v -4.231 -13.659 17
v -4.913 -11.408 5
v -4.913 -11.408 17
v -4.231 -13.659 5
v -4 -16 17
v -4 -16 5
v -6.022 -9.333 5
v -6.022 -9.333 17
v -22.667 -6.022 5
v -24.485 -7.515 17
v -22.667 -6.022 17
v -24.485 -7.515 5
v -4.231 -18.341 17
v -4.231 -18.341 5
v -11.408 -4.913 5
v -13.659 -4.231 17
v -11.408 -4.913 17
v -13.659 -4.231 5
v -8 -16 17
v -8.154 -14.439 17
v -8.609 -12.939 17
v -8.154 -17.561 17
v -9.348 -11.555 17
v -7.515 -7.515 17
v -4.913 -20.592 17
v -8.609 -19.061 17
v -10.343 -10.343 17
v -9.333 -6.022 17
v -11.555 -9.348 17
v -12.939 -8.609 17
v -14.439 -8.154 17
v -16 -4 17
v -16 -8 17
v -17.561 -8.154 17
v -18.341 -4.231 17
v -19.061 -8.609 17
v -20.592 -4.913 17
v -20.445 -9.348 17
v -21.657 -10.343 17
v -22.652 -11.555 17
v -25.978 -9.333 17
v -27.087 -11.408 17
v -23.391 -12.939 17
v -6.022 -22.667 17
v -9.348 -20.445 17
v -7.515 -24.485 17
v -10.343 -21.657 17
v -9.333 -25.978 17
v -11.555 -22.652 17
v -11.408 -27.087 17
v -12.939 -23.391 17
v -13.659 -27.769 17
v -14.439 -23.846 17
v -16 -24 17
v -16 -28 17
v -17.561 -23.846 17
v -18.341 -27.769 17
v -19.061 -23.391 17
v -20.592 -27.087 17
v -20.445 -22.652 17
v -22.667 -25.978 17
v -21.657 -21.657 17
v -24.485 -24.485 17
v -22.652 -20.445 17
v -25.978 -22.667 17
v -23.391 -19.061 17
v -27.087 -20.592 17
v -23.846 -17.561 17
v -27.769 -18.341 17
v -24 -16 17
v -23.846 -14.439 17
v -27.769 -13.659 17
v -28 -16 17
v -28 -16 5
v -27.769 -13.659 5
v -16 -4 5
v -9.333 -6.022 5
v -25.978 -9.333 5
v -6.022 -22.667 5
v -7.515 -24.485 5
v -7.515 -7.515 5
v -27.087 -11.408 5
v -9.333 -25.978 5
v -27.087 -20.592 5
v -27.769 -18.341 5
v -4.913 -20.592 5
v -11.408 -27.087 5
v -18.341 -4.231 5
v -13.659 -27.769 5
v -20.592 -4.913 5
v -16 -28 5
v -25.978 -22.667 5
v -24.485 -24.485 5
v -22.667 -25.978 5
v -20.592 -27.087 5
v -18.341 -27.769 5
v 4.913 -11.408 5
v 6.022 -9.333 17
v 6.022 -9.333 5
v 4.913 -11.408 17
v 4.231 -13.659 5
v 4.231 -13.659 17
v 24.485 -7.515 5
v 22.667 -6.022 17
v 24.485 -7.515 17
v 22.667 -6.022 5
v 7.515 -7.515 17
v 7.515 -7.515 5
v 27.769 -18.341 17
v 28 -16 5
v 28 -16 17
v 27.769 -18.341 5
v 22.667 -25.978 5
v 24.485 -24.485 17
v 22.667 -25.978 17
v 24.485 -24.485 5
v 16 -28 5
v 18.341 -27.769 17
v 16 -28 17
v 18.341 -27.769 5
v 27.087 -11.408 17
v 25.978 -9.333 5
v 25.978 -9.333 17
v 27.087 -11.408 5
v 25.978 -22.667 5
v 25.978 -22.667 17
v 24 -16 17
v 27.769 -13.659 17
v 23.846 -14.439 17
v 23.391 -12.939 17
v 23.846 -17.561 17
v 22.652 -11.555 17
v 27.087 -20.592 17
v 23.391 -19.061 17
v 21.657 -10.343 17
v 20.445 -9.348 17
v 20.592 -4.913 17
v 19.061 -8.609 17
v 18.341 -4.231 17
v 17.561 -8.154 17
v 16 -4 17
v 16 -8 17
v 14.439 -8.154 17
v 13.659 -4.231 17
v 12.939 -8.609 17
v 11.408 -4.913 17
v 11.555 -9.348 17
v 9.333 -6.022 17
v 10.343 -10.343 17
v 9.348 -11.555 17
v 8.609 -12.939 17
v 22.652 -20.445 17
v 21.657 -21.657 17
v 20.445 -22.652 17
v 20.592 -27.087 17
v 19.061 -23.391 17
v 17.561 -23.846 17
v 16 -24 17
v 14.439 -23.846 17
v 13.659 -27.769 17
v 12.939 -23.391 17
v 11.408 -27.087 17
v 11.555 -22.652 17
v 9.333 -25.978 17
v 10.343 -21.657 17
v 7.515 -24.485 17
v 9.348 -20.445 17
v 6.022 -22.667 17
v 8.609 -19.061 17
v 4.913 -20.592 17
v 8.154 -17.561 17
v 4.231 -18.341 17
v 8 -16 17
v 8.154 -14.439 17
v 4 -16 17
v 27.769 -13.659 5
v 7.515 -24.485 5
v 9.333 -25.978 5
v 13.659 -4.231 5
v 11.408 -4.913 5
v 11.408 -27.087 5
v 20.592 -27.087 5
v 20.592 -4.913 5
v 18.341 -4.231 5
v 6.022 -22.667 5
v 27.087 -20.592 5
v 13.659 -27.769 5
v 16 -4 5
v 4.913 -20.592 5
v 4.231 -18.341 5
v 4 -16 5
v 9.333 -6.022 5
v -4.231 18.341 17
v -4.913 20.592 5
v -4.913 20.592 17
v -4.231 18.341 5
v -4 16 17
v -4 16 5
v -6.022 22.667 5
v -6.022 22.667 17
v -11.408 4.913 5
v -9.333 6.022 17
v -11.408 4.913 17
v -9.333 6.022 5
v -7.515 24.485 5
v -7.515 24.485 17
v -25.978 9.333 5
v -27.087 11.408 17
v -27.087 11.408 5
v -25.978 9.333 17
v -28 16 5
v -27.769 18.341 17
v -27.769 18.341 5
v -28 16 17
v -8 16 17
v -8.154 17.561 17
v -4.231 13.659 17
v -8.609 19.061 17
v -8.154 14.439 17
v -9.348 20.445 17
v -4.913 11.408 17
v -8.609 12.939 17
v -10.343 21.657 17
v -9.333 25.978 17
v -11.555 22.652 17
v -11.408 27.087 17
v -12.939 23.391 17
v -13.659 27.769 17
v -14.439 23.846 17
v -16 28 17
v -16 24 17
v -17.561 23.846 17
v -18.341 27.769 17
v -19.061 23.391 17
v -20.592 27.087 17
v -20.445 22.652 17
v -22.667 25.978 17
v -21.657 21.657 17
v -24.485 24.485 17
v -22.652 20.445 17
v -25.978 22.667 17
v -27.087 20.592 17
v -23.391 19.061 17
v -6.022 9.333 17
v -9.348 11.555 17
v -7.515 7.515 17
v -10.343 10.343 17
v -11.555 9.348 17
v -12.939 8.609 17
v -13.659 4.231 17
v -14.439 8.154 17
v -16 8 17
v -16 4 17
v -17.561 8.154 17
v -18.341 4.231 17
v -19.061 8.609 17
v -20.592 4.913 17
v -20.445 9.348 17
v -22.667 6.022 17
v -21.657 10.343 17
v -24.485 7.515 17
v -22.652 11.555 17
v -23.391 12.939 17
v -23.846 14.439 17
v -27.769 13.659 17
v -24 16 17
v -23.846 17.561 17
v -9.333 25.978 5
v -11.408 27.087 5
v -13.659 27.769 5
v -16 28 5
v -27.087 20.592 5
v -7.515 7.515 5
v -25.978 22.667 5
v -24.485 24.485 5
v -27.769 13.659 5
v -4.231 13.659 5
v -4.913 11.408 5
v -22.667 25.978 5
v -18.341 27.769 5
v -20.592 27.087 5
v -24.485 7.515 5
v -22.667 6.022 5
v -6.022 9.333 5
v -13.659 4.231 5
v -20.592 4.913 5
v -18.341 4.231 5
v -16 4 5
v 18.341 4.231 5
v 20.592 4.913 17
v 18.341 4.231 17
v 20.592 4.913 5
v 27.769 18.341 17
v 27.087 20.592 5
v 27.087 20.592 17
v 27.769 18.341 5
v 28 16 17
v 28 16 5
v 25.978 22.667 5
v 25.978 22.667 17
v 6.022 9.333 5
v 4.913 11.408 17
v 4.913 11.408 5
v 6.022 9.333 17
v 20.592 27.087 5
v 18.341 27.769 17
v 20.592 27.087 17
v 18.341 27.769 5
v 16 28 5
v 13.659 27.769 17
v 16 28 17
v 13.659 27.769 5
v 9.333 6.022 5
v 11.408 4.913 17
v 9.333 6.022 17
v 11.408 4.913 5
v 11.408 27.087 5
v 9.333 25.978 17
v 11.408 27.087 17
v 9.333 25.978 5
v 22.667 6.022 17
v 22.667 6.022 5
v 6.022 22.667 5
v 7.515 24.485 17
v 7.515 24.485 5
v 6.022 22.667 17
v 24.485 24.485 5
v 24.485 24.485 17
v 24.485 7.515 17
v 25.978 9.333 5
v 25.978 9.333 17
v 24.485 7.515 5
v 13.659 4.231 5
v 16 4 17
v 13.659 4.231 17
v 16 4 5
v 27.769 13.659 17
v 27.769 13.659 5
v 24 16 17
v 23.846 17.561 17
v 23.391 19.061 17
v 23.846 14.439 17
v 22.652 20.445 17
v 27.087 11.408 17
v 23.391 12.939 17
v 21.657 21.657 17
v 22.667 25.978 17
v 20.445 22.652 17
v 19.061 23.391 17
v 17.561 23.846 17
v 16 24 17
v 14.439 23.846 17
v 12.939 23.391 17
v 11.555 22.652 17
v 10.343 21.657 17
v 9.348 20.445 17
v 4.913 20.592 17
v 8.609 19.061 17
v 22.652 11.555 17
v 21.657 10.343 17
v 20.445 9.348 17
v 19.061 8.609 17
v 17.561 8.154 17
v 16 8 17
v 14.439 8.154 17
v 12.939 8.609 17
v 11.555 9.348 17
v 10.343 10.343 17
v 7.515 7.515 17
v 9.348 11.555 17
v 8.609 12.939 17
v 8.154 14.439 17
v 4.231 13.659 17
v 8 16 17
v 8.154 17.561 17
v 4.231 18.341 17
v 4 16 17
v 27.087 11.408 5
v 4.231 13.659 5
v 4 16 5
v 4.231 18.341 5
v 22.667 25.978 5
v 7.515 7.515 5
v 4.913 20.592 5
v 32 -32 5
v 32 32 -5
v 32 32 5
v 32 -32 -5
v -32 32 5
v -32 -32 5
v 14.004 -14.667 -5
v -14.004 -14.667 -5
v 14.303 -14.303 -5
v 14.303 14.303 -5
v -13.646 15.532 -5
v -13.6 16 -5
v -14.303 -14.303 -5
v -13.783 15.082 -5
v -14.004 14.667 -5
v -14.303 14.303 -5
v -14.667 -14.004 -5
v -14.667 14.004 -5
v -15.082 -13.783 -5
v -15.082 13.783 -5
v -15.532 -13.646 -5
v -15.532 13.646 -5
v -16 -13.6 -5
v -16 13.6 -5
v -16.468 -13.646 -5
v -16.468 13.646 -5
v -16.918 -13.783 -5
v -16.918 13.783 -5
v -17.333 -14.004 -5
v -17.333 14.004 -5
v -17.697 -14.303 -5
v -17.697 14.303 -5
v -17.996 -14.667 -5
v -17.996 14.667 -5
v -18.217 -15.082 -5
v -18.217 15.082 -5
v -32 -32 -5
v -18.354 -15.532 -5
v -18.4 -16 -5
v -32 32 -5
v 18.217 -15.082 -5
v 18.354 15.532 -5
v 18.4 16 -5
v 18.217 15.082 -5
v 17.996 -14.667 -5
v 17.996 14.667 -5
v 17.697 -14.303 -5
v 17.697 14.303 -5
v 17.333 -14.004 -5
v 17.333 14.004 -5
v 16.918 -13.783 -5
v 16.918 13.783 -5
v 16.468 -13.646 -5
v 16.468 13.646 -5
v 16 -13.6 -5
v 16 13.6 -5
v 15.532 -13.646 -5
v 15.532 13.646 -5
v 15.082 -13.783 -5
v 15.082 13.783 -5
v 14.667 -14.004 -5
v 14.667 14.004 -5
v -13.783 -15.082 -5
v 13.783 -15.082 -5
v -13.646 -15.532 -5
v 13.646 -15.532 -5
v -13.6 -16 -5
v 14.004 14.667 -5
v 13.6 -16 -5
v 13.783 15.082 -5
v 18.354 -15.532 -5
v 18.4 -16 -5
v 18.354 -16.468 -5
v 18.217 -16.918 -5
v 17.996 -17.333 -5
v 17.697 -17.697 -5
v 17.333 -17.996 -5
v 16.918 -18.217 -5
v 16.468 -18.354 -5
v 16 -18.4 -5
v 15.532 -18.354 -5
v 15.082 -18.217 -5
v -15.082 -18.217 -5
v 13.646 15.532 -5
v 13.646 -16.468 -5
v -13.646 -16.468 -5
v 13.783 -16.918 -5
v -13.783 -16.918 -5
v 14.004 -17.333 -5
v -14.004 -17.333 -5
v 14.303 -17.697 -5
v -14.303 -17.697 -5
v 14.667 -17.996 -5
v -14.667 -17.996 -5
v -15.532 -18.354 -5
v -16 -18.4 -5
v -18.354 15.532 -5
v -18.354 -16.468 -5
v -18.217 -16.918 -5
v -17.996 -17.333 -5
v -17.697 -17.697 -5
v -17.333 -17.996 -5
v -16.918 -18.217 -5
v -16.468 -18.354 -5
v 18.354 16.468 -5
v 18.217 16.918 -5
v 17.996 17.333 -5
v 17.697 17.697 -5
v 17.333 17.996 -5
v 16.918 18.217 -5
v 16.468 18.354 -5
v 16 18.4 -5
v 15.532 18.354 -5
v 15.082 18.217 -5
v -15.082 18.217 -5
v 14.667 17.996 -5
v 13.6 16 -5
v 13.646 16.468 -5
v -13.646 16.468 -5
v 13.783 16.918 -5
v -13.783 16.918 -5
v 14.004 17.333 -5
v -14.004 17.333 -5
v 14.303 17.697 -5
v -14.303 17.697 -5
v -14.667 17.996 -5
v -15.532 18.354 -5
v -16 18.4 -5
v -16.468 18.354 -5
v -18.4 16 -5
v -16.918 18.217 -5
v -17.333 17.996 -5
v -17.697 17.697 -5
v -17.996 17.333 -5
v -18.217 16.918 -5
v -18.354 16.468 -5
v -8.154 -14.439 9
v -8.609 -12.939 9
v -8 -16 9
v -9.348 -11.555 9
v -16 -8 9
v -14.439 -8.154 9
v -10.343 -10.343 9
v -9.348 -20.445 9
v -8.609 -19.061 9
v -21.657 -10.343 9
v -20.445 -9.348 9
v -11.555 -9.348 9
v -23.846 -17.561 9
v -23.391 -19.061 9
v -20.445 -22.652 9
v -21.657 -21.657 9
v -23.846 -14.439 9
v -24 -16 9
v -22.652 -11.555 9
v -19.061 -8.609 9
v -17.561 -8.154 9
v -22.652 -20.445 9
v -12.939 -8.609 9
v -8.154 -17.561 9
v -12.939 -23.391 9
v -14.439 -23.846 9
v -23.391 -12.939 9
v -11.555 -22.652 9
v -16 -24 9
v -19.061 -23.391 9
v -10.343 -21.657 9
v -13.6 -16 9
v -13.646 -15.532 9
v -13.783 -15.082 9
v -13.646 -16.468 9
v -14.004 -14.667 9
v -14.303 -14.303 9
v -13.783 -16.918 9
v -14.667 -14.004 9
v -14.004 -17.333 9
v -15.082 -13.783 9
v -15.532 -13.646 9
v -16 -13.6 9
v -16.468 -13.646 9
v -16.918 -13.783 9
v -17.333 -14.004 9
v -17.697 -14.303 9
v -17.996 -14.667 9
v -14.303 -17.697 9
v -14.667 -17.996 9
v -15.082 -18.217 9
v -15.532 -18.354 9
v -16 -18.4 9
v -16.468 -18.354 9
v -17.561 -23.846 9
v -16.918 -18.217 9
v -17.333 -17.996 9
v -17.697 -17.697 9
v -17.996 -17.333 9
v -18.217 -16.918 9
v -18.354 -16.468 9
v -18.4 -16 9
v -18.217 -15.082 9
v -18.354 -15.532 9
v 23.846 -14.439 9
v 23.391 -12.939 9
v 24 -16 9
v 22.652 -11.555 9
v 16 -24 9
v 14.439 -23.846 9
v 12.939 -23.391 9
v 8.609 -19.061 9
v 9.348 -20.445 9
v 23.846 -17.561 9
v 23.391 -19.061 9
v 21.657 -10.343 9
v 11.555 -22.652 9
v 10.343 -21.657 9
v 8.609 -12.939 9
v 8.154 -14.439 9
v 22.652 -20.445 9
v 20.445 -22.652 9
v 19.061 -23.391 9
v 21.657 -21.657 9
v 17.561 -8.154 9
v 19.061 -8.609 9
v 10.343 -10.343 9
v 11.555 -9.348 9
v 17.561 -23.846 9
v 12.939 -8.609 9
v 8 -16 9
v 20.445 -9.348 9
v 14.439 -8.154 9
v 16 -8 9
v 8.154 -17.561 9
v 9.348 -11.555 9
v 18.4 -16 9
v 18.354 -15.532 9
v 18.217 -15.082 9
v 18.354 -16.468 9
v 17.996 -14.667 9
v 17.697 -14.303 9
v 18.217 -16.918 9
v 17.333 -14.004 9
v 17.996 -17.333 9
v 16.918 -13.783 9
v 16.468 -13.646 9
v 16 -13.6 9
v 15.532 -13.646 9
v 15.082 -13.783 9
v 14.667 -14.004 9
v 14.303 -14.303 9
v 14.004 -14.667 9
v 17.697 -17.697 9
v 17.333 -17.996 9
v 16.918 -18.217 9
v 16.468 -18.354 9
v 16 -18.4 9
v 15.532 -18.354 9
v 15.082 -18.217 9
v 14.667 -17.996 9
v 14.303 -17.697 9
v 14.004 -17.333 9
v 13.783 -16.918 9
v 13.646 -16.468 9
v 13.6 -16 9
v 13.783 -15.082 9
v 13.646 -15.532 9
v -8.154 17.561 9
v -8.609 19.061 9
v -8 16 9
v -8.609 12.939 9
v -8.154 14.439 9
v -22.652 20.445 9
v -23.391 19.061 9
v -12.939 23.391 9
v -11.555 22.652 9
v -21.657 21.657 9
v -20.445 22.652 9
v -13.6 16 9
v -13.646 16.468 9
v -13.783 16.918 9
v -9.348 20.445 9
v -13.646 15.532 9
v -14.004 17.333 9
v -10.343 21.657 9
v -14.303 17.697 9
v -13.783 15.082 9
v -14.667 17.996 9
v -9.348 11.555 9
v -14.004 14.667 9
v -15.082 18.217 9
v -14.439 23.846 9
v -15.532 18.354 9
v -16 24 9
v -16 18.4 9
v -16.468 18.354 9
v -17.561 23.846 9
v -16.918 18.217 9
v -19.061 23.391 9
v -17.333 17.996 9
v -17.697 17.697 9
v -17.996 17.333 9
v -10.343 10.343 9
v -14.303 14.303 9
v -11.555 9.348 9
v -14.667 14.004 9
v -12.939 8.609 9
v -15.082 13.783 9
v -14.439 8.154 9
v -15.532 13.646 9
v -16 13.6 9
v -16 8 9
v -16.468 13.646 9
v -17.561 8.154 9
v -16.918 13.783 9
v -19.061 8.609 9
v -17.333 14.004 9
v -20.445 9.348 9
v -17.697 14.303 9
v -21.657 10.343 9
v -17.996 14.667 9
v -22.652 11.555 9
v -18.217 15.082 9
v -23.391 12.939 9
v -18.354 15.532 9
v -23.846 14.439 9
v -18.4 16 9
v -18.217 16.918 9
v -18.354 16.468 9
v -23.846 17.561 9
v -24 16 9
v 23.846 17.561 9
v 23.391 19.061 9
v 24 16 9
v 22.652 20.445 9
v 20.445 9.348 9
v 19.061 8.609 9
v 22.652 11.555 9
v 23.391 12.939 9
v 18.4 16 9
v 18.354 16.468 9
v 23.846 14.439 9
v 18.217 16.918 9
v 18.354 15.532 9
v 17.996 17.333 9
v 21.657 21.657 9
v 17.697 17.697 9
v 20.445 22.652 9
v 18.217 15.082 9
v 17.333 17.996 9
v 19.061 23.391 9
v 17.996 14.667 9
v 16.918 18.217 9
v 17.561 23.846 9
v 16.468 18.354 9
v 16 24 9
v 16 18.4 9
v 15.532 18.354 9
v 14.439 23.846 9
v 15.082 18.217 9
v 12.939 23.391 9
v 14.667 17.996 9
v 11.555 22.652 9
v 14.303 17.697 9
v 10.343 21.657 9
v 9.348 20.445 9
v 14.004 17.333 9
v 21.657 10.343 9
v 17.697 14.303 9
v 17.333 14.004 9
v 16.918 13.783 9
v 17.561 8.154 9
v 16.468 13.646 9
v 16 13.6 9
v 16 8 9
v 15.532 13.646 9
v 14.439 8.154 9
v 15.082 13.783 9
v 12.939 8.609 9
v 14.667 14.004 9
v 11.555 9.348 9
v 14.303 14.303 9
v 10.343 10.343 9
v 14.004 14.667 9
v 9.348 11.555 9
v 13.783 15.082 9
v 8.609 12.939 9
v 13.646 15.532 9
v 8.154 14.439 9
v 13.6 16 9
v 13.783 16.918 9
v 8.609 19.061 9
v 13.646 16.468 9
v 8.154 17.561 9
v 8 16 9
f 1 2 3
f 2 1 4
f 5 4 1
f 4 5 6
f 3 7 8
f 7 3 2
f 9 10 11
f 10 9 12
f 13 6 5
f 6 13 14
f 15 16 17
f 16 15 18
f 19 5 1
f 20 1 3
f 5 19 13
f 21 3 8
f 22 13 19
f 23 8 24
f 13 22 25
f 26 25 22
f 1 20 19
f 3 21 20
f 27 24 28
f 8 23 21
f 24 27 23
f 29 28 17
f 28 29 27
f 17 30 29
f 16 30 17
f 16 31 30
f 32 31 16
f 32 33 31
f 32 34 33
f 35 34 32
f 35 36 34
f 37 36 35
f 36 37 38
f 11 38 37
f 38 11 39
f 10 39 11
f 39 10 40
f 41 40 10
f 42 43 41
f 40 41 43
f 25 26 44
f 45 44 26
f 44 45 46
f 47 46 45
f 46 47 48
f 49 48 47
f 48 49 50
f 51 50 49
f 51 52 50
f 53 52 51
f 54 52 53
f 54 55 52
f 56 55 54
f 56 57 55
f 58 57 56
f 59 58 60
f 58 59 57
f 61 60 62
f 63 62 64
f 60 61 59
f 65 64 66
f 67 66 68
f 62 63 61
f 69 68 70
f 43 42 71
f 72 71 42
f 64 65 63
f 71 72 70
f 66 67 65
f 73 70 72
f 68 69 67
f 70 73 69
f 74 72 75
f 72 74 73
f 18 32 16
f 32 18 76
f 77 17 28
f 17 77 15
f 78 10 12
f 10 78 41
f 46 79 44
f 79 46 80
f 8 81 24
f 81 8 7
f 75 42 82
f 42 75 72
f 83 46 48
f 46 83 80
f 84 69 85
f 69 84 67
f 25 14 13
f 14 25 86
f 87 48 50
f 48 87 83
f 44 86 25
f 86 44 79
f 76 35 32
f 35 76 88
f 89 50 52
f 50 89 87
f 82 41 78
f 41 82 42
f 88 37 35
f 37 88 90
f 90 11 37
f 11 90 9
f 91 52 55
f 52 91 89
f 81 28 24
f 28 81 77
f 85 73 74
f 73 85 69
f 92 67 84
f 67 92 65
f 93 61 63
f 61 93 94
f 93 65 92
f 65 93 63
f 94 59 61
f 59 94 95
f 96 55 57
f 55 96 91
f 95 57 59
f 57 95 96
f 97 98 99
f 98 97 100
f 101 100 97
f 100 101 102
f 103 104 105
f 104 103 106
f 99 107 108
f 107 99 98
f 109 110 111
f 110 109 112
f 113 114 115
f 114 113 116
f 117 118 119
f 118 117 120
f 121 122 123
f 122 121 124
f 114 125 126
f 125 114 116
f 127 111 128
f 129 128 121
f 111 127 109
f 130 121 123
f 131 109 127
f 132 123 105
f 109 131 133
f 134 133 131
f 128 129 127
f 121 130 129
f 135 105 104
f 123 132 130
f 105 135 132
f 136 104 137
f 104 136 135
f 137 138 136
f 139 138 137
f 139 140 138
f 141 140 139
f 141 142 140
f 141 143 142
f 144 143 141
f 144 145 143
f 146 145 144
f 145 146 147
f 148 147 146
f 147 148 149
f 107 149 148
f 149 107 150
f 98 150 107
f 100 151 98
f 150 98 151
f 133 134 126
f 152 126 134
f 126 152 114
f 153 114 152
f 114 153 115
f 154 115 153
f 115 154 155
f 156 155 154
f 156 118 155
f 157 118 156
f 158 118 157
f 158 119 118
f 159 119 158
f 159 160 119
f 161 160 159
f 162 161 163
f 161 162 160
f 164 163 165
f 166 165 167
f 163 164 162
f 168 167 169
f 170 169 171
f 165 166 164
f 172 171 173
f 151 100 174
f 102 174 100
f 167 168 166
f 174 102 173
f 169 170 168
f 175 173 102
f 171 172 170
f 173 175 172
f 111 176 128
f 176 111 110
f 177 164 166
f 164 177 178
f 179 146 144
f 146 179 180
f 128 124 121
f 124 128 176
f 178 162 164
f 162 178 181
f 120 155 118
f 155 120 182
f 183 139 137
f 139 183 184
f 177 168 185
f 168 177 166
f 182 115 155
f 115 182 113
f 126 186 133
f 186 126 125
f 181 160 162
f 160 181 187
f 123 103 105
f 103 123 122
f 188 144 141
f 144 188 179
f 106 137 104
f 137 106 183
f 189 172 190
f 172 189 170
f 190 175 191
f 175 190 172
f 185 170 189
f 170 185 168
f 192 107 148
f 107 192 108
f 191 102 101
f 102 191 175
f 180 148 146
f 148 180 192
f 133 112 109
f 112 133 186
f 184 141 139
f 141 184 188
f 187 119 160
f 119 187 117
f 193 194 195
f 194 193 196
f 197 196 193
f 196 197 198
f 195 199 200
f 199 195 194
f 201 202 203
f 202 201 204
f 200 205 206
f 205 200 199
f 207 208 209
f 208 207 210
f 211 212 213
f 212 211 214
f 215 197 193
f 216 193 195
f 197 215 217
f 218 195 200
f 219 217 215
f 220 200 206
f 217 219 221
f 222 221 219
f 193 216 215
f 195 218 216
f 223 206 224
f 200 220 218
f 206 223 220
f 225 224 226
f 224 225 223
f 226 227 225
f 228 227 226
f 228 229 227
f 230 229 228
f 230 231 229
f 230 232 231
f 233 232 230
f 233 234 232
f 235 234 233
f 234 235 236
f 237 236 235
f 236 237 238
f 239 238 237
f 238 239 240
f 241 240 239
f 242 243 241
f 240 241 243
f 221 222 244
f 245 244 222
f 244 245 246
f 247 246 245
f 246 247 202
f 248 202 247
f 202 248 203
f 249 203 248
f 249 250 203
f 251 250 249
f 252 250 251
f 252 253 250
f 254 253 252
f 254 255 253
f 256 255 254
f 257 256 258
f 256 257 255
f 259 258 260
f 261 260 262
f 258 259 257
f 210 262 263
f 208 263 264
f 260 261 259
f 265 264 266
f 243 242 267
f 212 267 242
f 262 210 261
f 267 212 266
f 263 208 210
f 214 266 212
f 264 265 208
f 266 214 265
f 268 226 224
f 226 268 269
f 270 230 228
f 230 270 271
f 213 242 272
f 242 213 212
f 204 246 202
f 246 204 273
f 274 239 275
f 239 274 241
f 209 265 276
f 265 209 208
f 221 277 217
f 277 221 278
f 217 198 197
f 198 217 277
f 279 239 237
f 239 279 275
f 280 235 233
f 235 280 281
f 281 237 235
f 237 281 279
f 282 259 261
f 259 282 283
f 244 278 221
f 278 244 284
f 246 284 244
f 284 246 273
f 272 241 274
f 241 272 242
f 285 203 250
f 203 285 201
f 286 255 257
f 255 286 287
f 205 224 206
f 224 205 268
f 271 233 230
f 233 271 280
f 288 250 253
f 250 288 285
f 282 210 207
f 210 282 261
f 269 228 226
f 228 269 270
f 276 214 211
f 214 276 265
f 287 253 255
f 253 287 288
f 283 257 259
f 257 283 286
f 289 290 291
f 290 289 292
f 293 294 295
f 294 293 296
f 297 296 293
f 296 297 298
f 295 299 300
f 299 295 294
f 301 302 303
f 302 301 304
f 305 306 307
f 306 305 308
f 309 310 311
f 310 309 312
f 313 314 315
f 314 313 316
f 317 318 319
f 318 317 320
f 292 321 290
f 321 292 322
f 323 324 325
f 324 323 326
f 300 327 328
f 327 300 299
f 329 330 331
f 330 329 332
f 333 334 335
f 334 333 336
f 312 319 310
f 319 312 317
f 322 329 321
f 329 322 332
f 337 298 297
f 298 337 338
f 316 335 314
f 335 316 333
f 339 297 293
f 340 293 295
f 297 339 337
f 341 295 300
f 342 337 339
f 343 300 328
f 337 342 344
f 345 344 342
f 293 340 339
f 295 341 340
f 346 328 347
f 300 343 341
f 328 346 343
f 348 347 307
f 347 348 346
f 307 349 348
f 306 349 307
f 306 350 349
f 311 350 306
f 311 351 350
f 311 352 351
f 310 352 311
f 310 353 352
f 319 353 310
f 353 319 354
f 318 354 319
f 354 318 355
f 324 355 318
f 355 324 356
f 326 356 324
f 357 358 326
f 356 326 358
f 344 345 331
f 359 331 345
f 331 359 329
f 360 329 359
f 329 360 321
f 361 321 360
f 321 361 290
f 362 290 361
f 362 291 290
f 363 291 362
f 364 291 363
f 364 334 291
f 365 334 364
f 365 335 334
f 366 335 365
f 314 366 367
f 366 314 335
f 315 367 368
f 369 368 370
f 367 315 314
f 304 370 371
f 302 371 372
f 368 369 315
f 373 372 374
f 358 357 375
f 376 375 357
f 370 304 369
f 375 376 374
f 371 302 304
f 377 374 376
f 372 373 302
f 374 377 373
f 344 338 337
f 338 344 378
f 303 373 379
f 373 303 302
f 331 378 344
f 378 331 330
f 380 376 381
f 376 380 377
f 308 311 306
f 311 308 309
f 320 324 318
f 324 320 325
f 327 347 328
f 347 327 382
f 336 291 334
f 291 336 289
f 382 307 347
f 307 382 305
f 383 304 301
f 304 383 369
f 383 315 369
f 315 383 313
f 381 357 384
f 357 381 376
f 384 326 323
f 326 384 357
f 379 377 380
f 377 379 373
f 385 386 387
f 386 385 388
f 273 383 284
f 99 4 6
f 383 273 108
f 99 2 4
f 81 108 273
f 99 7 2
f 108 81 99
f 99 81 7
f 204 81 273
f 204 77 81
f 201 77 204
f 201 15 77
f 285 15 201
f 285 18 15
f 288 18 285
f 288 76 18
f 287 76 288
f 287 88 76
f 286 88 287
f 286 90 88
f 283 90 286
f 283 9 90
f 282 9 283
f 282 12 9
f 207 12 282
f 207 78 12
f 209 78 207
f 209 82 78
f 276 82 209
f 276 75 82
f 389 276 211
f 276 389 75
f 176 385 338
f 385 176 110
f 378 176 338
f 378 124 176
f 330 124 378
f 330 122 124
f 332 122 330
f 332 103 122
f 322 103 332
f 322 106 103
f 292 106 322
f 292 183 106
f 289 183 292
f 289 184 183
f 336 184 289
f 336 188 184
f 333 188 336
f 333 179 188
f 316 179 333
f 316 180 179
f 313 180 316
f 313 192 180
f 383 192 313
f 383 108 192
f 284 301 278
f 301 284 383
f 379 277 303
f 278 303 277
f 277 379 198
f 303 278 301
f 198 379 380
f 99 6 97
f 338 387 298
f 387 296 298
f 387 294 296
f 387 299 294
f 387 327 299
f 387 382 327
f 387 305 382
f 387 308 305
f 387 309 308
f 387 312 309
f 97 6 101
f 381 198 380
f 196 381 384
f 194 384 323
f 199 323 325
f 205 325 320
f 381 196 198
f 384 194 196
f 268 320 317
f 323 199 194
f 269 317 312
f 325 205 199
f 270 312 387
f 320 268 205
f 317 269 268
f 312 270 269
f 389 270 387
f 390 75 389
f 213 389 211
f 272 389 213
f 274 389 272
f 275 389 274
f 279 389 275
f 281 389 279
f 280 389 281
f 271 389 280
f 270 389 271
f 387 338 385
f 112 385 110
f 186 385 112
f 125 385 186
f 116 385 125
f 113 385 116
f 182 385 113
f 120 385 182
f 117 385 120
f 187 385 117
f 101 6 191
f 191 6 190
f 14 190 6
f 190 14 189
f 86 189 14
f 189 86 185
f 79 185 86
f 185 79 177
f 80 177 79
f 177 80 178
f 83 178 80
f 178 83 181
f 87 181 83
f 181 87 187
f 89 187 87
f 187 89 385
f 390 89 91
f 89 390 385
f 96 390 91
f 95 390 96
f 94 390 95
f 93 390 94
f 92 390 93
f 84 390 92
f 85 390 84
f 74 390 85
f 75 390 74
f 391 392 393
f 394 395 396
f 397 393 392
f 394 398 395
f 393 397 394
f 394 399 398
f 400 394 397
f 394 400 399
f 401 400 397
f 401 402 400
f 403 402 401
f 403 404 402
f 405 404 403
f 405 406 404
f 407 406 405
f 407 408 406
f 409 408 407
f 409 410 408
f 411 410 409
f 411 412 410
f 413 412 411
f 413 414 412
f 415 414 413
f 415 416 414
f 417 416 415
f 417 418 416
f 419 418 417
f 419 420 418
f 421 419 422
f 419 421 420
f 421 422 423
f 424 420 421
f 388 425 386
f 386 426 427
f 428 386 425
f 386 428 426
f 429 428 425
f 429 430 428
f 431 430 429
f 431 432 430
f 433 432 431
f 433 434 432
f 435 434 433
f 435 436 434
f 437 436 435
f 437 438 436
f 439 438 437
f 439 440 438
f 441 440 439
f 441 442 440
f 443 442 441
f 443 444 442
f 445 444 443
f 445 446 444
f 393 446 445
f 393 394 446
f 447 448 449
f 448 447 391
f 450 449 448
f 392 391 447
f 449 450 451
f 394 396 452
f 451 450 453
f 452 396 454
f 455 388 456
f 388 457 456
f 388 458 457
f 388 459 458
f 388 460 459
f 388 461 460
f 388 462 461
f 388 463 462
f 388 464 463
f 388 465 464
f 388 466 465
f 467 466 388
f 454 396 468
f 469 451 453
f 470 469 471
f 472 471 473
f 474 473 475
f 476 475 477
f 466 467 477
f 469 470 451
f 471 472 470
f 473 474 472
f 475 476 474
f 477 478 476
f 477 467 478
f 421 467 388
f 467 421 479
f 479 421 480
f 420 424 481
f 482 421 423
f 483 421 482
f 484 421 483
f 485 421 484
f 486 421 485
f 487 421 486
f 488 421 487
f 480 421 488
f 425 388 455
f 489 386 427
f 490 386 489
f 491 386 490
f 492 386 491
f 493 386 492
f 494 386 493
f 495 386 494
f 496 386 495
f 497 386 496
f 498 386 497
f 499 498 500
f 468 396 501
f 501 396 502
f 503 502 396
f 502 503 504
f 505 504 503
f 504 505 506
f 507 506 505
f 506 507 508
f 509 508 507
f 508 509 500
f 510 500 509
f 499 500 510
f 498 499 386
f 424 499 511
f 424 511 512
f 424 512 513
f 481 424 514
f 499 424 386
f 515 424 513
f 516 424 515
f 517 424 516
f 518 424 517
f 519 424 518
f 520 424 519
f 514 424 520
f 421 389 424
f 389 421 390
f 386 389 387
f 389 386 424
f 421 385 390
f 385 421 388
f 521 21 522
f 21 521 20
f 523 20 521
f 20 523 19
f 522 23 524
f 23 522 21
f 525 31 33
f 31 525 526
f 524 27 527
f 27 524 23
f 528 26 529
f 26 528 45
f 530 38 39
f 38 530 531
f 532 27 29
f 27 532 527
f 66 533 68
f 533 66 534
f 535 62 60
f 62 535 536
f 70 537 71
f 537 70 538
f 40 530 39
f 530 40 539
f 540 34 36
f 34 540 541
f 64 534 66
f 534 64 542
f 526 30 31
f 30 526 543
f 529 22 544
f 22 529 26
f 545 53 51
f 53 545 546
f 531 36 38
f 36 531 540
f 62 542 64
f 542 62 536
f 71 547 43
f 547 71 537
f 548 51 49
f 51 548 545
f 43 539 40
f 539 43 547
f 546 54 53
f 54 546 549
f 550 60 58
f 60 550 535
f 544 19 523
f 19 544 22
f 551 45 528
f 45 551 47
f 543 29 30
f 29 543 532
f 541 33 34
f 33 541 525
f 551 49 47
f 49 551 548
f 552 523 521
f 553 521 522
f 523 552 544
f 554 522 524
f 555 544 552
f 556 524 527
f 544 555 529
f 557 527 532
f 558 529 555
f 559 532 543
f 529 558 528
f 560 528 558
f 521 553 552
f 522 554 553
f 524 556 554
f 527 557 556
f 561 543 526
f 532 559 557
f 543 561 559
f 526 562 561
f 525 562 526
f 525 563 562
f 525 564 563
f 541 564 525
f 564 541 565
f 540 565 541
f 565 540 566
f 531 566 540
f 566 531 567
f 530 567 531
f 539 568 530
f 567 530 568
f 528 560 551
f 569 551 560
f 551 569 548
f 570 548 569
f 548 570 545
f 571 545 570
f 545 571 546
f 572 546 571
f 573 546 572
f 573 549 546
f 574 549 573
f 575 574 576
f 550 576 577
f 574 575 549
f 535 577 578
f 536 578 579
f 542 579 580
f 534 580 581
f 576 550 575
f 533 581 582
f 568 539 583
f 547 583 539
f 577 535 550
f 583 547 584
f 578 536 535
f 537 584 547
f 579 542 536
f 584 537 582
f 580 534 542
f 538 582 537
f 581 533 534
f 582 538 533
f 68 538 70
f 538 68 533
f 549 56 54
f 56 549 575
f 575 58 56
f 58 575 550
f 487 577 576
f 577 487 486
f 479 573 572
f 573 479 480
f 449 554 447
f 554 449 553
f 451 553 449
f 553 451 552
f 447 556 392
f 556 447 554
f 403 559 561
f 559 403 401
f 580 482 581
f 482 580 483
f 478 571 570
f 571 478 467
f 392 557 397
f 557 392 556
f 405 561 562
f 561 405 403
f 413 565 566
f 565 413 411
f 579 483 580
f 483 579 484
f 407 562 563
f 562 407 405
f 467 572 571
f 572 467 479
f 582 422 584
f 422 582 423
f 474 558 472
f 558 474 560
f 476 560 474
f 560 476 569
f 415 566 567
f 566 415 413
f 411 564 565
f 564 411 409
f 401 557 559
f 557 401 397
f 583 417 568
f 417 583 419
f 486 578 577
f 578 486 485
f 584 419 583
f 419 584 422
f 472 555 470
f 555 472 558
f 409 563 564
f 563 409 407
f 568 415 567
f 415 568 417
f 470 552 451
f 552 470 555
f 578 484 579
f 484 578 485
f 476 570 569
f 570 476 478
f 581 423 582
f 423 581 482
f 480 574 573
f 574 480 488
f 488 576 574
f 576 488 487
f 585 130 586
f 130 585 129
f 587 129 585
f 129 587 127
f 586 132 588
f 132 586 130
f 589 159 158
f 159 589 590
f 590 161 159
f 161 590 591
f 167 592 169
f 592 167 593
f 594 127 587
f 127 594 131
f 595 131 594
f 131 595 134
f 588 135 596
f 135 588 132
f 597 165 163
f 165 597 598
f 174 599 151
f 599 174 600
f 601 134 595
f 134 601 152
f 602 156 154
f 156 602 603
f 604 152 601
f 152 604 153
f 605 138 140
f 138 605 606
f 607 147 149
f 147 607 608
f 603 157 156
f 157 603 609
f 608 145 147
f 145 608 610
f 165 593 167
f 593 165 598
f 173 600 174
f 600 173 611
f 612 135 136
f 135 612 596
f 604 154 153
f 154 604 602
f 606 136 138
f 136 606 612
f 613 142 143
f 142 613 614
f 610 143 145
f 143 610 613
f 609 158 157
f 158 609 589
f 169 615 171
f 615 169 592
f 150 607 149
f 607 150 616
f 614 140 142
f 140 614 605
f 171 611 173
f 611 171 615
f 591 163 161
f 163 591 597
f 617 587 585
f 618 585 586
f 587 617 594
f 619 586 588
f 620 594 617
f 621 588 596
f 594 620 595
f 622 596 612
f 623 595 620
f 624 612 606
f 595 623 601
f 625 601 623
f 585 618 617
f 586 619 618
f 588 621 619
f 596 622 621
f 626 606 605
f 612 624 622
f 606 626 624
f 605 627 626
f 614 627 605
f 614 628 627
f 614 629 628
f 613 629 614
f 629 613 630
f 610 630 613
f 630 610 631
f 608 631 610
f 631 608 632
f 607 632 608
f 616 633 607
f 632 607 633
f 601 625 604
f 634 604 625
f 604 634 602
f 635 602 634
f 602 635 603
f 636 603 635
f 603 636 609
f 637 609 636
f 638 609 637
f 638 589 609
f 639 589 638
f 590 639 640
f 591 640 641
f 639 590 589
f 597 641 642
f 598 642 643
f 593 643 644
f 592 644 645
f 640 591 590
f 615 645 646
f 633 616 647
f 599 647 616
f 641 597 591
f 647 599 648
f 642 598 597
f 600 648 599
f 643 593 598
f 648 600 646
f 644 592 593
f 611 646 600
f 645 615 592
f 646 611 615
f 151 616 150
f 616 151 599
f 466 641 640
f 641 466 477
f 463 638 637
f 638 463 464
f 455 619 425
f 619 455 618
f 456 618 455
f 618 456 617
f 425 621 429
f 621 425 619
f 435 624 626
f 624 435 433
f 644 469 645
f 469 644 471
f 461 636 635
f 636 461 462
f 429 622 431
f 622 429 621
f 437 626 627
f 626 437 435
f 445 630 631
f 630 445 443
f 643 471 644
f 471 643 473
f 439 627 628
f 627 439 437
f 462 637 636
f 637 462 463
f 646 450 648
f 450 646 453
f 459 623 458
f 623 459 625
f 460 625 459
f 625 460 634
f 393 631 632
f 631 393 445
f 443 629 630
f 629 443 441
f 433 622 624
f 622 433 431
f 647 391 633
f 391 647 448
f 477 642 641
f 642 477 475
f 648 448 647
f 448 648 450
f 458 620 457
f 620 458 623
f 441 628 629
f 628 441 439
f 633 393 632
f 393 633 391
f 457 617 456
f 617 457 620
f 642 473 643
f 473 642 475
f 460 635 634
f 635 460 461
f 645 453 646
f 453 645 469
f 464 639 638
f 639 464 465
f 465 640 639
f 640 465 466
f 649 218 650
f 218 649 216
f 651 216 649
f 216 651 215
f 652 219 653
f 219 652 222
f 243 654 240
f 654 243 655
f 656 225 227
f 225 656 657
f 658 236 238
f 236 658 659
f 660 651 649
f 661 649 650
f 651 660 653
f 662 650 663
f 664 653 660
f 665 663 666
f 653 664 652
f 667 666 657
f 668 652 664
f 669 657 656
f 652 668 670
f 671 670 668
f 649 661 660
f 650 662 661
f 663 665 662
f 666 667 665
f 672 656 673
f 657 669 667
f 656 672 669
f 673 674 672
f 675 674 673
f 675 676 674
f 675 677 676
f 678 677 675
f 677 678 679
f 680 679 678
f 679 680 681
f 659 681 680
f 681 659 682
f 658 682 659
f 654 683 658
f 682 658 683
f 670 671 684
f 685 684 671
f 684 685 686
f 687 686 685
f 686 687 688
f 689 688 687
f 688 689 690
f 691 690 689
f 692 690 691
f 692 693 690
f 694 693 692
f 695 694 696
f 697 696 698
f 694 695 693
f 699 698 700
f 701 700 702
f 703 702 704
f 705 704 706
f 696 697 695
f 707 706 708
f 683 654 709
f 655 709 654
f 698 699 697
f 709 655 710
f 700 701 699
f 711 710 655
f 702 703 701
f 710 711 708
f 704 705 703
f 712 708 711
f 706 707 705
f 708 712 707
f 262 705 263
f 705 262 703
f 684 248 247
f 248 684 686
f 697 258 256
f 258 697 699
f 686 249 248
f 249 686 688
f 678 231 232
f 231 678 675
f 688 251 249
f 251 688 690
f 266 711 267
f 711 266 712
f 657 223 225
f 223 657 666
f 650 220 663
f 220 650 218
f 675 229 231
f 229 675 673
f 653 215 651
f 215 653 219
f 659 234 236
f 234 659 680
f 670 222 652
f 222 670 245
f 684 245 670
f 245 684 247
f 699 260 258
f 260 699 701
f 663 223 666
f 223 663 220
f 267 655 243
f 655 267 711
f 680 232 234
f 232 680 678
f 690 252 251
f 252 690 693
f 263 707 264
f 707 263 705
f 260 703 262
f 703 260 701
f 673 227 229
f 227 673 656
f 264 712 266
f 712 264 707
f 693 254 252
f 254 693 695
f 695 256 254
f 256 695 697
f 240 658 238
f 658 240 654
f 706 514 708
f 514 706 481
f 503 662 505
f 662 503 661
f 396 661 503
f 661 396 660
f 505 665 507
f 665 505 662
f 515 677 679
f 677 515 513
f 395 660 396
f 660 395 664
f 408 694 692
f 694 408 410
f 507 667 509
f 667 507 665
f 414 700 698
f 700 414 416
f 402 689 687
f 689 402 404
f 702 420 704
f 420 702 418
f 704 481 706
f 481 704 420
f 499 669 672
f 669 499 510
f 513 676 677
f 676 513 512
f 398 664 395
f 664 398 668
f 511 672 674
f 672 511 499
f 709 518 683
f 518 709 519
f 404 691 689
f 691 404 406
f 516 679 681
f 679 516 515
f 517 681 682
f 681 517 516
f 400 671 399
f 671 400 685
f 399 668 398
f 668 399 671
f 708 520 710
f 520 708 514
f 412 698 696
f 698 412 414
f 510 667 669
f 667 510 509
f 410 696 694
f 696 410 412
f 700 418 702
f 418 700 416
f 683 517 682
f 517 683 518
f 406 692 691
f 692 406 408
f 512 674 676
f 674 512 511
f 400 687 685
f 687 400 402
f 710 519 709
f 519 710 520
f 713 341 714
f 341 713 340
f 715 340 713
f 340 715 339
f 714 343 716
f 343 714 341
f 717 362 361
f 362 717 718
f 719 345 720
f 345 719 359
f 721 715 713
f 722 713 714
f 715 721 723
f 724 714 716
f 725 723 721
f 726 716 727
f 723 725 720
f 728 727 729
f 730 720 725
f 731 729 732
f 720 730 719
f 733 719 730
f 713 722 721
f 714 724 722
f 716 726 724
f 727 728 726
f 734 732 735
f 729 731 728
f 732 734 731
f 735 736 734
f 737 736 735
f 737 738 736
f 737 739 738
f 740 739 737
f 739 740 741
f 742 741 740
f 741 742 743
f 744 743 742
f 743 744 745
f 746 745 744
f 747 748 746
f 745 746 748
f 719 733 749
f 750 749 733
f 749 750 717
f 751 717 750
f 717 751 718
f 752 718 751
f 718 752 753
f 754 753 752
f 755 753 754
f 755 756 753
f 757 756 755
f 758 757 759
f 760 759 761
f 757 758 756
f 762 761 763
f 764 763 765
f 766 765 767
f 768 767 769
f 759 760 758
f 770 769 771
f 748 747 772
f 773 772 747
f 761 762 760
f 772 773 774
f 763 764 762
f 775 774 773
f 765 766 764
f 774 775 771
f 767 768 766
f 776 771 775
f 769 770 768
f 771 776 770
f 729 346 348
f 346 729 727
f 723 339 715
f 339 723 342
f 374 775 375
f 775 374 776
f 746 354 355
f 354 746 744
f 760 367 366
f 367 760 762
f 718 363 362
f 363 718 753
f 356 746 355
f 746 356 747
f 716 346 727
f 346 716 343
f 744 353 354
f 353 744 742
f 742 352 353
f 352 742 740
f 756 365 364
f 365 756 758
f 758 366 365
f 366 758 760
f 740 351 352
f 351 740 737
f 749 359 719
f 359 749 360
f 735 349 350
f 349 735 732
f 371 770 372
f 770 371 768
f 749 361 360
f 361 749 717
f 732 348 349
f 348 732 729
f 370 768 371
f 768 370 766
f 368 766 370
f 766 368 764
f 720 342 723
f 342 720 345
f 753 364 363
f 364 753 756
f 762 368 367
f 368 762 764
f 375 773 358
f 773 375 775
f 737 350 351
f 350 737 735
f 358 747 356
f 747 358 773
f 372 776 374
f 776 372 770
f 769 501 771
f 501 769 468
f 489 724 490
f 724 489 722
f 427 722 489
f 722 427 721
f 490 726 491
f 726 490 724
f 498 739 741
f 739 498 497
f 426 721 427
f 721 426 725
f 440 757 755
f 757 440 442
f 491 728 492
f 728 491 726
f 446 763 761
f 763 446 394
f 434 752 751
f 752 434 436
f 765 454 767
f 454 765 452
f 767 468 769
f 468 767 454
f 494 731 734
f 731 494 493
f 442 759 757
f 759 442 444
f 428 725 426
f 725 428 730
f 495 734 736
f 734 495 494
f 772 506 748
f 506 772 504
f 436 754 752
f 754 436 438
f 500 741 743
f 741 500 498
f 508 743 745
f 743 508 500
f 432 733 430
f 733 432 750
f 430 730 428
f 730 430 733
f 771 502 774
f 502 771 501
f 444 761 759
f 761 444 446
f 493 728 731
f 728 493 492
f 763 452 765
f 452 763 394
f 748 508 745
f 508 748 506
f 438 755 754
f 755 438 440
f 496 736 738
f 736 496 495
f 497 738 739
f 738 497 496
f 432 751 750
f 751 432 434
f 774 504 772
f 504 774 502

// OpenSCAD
$fn = 32;

// ----------------------------------------------------------------------
// Socket pad plate
// bosses with counterbored sockets for the screws
// ----------------------------------------------------------------------

// --- parameters (mm) ---
base_t = 10;       // base plate thickness
boss_h = 12;       // boss height above the base plate
boss_d = 24;       // boss diameter
socket_d = 16;     // socket diameter
socket_depth = 8;  // socket depth from the boss face
bolt_d = 4.8;      // screw clearance hole through the socket floor
rows = 2;          // boss rows
cols = 2;          // bosses per row
pitch = 32;        // boss pitch

// --- derived feature positions (mm) ---
height = base_t + boss_h;           // = 22   overall height of the part
plate = [pitch * (cols - 1) + boss_d + 8, pitch * (rows - 1) + boss_d + 8, base_t];  // = [64, 64, 10]   overall size (x, y, z)
span_x = pitch * (cols - 1);        // = 32   distance between outer bosses
span_y = pitch * (rows - 1);        // = 32   distance between boss rows
origin_x = -span_x / 2;             // = -16   X of the first boss
origin_y = -span_y / 2;             // = -16   Y of the first boss
feature_centers = [
  [origin_x + 0 * pitch, origin_y + 0 * pitch],
  [origin_x + 1 * pitch, origin_y + 0 * pitch],
  [origin_x + 0 * pitch, origin_y + 1 * pitch],
  [origin_x + 1 * pitch, origin_y + 1 * pitch]
];   // boss centres: sockets, holes and the pads themselves are placed from here

// base plate, bosses on feature_centers, socket + through hole in each
difference() {
  union() {
    cube(plate, center = true);
    for (centre = feature_centers)
      translate([centre[0], centre[1], plate[2] / 2 - 1])
        cylinder(d = boss_d, h = boss_h + 1);
  }
  for (centre = feature_centers) {
    translate([centre[0], centre[1], plate[2] / 2 + boss_h - socket_depth])
      cylinder(d = socket_d, h = socket_depth + 1);
    translate([centre[0], centre[1], -height])
      cylinder(d = bolt_d, h = 2 * height + 2);  // through the socket floor
  }
}
